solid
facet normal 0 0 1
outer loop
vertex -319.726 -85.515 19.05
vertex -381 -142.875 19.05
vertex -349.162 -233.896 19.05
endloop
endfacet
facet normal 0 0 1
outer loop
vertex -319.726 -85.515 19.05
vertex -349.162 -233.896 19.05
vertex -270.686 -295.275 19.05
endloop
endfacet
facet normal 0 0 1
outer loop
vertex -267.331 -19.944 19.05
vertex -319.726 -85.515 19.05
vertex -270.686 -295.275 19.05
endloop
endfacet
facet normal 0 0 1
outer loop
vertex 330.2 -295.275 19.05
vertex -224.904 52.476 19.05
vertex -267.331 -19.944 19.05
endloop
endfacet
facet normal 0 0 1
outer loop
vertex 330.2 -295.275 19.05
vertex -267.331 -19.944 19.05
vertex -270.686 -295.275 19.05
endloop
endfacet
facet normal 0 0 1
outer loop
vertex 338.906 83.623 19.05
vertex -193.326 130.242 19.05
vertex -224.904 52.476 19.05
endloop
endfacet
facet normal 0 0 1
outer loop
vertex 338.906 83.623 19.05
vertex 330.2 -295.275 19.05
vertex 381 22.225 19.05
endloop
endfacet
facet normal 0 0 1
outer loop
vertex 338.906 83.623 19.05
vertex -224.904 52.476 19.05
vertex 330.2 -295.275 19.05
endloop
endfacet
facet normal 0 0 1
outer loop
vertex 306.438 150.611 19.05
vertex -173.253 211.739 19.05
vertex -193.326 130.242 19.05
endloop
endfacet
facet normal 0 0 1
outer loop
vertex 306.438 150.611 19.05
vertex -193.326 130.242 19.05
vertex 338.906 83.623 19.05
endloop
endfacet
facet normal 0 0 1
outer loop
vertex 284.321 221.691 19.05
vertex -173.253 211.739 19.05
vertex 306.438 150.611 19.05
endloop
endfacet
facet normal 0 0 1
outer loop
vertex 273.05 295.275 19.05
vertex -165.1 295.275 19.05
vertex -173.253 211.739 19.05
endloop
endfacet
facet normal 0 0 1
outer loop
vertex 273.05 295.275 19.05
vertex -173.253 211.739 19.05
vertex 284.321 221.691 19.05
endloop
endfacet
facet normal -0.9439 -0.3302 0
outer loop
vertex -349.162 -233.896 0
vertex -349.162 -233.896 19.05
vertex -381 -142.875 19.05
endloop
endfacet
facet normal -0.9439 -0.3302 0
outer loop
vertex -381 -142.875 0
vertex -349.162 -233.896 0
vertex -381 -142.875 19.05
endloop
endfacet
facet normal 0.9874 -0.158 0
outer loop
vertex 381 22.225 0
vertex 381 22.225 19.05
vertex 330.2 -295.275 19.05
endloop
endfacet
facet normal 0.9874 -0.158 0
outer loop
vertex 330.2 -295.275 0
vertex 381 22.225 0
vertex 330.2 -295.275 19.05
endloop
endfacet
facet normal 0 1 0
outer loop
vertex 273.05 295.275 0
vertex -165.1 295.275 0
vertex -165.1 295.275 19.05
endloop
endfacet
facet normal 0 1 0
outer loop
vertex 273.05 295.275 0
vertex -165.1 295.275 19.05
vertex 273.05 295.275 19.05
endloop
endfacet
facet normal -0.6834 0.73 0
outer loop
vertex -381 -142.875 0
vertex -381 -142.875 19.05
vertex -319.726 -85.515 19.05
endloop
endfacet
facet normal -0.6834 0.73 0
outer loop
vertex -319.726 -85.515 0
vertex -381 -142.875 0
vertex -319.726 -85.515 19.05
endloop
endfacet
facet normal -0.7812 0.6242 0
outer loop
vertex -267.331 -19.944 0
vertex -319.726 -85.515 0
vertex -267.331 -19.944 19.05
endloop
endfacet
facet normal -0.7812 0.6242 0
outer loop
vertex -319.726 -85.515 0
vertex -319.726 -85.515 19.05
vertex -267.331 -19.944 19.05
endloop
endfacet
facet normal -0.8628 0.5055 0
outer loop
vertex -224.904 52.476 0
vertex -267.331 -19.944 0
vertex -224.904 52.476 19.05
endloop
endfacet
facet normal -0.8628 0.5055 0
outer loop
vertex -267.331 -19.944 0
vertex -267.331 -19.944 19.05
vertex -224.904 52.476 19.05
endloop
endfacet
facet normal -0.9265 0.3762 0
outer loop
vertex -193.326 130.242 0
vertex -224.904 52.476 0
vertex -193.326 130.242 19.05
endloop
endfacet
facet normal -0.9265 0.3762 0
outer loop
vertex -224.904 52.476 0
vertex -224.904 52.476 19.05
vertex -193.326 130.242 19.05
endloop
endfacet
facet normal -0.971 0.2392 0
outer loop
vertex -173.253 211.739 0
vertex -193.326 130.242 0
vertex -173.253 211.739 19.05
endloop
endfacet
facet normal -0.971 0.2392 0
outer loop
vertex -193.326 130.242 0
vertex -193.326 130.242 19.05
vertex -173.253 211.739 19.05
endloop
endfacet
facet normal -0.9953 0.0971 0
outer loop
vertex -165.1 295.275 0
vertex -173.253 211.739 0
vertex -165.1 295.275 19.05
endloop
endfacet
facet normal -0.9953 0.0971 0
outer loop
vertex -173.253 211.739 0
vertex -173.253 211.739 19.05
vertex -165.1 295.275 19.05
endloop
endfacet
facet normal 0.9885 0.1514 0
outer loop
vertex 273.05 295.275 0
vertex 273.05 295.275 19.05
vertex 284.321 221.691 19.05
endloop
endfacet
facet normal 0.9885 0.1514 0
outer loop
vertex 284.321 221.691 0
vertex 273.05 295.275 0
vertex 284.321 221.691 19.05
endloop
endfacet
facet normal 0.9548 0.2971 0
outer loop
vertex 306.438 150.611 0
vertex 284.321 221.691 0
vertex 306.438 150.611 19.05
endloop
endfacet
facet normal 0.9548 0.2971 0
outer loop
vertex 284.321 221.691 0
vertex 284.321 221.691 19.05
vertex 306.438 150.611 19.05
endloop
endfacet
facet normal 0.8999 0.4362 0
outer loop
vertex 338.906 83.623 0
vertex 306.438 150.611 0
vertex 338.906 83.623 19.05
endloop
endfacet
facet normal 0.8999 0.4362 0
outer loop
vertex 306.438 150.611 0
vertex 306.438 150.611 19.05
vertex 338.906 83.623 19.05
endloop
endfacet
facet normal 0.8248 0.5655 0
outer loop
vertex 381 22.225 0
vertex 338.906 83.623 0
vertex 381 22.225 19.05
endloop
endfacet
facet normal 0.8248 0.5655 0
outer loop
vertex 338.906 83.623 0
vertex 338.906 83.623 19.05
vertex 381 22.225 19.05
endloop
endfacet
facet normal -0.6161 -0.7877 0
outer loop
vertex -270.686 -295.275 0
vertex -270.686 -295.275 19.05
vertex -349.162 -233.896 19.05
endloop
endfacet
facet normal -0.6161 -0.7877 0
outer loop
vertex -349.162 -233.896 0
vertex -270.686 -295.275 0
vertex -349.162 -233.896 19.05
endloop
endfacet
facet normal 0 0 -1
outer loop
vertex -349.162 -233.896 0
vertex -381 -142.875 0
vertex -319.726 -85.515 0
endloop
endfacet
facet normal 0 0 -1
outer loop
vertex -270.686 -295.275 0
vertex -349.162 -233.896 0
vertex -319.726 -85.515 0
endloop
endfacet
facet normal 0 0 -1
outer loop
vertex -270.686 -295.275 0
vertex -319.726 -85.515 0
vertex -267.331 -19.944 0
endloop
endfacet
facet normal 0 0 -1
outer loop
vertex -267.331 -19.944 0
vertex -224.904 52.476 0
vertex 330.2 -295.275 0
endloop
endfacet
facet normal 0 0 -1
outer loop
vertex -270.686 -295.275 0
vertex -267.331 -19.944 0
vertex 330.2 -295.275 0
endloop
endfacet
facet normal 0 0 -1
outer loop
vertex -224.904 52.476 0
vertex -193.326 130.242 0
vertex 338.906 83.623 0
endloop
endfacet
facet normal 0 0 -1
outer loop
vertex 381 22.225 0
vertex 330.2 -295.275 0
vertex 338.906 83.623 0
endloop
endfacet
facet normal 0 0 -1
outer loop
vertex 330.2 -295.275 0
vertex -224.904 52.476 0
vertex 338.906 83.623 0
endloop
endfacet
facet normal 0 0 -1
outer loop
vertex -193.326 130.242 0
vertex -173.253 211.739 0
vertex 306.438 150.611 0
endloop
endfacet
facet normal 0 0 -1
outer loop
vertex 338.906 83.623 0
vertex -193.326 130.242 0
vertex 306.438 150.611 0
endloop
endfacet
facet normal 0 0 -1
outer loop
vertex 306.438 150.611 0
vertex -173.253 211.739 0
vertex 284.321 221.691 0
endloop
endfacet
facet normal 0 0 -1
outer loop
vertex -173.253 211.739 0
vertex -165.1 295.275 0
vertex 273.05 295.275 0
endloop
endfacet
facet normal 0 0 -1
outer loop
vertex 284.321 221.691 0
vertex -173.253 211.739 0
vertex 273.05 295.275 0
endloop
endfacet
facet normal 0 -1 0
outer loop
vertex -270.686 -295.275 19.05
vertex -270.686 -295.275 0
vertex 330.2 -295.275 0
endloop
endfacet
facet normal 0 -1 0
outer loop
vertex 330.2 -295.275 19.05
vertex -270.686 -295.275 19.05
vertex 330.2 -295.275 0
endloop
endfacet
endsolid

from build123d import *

# Parameters (mm, degrees)
F0_W     = 762
F0_H     = 590.55
F1_DEPTH = 19.05
F3_DEPTH = 25.4
F5_DEPTH = 25.4
F7_DEPTH = 25.4
F9_DEPTH = 25.4


with BuildPart() as f1:
    # F0 (on Top) → F1 (new body)
    with BuildSketch(Plane.XY):
        Rectangle(F0_W, F0_H)
    extrude(amount=F1_DEPTH)

    # F2 (on face) → F3 (cut)
    with BuildSketch(Plane.XY.offset(19.05)):
        with BuildLine():
            ThreePointArc((-381, -142.875), (-224.904359, 52.476061), (-165.1, 295.275))
            Line((-165.1, 295.275), (-381, 295.275))
            Line((-381, 295.275), (-381, -142.875))
        make_face()
    extrude(amount=-F3_DEPTH, mode=Mode.SUBTRACT)

    # F4 (on face) → F5 (cut)
    with BuildSketch(Plane.XY.offset(19.05)):
        with BuildLine():
            Line((381, 22.225), (381, 295.275))
            Line((381, 295.275), (273.05, 295.275))
            ThreePointArc((273.05, 295.275), (306.438019, 150.610961), (381, 22.225))
        make_face()
    extrude(amount=-F5_DEPTH, mode=Mode.SUBTRACT)

    # F6 (on face) → F7 (cut)
    with BuildSketch(Plane.XY.offset(19.05)):
        Polygon((381, -295.275), (381, 22.225), (330.2, -295.275), align=None)
    extrude(amount=-F7_DEPTH, mode=Mode.SUBTRACT)

    # F8 (on face) → F9 (cut)
    with BuildSketch(Plane.XY.offset(19.05)):
        Polygon((-349.161536, -233.895749), (-381, -142.875), (-381, -295.275), (-270.685613, -295.275), align=None)
    extrude(amount=-F9_DEPTH, mode=Mode.SUBTRACT)


solid = f1.part
